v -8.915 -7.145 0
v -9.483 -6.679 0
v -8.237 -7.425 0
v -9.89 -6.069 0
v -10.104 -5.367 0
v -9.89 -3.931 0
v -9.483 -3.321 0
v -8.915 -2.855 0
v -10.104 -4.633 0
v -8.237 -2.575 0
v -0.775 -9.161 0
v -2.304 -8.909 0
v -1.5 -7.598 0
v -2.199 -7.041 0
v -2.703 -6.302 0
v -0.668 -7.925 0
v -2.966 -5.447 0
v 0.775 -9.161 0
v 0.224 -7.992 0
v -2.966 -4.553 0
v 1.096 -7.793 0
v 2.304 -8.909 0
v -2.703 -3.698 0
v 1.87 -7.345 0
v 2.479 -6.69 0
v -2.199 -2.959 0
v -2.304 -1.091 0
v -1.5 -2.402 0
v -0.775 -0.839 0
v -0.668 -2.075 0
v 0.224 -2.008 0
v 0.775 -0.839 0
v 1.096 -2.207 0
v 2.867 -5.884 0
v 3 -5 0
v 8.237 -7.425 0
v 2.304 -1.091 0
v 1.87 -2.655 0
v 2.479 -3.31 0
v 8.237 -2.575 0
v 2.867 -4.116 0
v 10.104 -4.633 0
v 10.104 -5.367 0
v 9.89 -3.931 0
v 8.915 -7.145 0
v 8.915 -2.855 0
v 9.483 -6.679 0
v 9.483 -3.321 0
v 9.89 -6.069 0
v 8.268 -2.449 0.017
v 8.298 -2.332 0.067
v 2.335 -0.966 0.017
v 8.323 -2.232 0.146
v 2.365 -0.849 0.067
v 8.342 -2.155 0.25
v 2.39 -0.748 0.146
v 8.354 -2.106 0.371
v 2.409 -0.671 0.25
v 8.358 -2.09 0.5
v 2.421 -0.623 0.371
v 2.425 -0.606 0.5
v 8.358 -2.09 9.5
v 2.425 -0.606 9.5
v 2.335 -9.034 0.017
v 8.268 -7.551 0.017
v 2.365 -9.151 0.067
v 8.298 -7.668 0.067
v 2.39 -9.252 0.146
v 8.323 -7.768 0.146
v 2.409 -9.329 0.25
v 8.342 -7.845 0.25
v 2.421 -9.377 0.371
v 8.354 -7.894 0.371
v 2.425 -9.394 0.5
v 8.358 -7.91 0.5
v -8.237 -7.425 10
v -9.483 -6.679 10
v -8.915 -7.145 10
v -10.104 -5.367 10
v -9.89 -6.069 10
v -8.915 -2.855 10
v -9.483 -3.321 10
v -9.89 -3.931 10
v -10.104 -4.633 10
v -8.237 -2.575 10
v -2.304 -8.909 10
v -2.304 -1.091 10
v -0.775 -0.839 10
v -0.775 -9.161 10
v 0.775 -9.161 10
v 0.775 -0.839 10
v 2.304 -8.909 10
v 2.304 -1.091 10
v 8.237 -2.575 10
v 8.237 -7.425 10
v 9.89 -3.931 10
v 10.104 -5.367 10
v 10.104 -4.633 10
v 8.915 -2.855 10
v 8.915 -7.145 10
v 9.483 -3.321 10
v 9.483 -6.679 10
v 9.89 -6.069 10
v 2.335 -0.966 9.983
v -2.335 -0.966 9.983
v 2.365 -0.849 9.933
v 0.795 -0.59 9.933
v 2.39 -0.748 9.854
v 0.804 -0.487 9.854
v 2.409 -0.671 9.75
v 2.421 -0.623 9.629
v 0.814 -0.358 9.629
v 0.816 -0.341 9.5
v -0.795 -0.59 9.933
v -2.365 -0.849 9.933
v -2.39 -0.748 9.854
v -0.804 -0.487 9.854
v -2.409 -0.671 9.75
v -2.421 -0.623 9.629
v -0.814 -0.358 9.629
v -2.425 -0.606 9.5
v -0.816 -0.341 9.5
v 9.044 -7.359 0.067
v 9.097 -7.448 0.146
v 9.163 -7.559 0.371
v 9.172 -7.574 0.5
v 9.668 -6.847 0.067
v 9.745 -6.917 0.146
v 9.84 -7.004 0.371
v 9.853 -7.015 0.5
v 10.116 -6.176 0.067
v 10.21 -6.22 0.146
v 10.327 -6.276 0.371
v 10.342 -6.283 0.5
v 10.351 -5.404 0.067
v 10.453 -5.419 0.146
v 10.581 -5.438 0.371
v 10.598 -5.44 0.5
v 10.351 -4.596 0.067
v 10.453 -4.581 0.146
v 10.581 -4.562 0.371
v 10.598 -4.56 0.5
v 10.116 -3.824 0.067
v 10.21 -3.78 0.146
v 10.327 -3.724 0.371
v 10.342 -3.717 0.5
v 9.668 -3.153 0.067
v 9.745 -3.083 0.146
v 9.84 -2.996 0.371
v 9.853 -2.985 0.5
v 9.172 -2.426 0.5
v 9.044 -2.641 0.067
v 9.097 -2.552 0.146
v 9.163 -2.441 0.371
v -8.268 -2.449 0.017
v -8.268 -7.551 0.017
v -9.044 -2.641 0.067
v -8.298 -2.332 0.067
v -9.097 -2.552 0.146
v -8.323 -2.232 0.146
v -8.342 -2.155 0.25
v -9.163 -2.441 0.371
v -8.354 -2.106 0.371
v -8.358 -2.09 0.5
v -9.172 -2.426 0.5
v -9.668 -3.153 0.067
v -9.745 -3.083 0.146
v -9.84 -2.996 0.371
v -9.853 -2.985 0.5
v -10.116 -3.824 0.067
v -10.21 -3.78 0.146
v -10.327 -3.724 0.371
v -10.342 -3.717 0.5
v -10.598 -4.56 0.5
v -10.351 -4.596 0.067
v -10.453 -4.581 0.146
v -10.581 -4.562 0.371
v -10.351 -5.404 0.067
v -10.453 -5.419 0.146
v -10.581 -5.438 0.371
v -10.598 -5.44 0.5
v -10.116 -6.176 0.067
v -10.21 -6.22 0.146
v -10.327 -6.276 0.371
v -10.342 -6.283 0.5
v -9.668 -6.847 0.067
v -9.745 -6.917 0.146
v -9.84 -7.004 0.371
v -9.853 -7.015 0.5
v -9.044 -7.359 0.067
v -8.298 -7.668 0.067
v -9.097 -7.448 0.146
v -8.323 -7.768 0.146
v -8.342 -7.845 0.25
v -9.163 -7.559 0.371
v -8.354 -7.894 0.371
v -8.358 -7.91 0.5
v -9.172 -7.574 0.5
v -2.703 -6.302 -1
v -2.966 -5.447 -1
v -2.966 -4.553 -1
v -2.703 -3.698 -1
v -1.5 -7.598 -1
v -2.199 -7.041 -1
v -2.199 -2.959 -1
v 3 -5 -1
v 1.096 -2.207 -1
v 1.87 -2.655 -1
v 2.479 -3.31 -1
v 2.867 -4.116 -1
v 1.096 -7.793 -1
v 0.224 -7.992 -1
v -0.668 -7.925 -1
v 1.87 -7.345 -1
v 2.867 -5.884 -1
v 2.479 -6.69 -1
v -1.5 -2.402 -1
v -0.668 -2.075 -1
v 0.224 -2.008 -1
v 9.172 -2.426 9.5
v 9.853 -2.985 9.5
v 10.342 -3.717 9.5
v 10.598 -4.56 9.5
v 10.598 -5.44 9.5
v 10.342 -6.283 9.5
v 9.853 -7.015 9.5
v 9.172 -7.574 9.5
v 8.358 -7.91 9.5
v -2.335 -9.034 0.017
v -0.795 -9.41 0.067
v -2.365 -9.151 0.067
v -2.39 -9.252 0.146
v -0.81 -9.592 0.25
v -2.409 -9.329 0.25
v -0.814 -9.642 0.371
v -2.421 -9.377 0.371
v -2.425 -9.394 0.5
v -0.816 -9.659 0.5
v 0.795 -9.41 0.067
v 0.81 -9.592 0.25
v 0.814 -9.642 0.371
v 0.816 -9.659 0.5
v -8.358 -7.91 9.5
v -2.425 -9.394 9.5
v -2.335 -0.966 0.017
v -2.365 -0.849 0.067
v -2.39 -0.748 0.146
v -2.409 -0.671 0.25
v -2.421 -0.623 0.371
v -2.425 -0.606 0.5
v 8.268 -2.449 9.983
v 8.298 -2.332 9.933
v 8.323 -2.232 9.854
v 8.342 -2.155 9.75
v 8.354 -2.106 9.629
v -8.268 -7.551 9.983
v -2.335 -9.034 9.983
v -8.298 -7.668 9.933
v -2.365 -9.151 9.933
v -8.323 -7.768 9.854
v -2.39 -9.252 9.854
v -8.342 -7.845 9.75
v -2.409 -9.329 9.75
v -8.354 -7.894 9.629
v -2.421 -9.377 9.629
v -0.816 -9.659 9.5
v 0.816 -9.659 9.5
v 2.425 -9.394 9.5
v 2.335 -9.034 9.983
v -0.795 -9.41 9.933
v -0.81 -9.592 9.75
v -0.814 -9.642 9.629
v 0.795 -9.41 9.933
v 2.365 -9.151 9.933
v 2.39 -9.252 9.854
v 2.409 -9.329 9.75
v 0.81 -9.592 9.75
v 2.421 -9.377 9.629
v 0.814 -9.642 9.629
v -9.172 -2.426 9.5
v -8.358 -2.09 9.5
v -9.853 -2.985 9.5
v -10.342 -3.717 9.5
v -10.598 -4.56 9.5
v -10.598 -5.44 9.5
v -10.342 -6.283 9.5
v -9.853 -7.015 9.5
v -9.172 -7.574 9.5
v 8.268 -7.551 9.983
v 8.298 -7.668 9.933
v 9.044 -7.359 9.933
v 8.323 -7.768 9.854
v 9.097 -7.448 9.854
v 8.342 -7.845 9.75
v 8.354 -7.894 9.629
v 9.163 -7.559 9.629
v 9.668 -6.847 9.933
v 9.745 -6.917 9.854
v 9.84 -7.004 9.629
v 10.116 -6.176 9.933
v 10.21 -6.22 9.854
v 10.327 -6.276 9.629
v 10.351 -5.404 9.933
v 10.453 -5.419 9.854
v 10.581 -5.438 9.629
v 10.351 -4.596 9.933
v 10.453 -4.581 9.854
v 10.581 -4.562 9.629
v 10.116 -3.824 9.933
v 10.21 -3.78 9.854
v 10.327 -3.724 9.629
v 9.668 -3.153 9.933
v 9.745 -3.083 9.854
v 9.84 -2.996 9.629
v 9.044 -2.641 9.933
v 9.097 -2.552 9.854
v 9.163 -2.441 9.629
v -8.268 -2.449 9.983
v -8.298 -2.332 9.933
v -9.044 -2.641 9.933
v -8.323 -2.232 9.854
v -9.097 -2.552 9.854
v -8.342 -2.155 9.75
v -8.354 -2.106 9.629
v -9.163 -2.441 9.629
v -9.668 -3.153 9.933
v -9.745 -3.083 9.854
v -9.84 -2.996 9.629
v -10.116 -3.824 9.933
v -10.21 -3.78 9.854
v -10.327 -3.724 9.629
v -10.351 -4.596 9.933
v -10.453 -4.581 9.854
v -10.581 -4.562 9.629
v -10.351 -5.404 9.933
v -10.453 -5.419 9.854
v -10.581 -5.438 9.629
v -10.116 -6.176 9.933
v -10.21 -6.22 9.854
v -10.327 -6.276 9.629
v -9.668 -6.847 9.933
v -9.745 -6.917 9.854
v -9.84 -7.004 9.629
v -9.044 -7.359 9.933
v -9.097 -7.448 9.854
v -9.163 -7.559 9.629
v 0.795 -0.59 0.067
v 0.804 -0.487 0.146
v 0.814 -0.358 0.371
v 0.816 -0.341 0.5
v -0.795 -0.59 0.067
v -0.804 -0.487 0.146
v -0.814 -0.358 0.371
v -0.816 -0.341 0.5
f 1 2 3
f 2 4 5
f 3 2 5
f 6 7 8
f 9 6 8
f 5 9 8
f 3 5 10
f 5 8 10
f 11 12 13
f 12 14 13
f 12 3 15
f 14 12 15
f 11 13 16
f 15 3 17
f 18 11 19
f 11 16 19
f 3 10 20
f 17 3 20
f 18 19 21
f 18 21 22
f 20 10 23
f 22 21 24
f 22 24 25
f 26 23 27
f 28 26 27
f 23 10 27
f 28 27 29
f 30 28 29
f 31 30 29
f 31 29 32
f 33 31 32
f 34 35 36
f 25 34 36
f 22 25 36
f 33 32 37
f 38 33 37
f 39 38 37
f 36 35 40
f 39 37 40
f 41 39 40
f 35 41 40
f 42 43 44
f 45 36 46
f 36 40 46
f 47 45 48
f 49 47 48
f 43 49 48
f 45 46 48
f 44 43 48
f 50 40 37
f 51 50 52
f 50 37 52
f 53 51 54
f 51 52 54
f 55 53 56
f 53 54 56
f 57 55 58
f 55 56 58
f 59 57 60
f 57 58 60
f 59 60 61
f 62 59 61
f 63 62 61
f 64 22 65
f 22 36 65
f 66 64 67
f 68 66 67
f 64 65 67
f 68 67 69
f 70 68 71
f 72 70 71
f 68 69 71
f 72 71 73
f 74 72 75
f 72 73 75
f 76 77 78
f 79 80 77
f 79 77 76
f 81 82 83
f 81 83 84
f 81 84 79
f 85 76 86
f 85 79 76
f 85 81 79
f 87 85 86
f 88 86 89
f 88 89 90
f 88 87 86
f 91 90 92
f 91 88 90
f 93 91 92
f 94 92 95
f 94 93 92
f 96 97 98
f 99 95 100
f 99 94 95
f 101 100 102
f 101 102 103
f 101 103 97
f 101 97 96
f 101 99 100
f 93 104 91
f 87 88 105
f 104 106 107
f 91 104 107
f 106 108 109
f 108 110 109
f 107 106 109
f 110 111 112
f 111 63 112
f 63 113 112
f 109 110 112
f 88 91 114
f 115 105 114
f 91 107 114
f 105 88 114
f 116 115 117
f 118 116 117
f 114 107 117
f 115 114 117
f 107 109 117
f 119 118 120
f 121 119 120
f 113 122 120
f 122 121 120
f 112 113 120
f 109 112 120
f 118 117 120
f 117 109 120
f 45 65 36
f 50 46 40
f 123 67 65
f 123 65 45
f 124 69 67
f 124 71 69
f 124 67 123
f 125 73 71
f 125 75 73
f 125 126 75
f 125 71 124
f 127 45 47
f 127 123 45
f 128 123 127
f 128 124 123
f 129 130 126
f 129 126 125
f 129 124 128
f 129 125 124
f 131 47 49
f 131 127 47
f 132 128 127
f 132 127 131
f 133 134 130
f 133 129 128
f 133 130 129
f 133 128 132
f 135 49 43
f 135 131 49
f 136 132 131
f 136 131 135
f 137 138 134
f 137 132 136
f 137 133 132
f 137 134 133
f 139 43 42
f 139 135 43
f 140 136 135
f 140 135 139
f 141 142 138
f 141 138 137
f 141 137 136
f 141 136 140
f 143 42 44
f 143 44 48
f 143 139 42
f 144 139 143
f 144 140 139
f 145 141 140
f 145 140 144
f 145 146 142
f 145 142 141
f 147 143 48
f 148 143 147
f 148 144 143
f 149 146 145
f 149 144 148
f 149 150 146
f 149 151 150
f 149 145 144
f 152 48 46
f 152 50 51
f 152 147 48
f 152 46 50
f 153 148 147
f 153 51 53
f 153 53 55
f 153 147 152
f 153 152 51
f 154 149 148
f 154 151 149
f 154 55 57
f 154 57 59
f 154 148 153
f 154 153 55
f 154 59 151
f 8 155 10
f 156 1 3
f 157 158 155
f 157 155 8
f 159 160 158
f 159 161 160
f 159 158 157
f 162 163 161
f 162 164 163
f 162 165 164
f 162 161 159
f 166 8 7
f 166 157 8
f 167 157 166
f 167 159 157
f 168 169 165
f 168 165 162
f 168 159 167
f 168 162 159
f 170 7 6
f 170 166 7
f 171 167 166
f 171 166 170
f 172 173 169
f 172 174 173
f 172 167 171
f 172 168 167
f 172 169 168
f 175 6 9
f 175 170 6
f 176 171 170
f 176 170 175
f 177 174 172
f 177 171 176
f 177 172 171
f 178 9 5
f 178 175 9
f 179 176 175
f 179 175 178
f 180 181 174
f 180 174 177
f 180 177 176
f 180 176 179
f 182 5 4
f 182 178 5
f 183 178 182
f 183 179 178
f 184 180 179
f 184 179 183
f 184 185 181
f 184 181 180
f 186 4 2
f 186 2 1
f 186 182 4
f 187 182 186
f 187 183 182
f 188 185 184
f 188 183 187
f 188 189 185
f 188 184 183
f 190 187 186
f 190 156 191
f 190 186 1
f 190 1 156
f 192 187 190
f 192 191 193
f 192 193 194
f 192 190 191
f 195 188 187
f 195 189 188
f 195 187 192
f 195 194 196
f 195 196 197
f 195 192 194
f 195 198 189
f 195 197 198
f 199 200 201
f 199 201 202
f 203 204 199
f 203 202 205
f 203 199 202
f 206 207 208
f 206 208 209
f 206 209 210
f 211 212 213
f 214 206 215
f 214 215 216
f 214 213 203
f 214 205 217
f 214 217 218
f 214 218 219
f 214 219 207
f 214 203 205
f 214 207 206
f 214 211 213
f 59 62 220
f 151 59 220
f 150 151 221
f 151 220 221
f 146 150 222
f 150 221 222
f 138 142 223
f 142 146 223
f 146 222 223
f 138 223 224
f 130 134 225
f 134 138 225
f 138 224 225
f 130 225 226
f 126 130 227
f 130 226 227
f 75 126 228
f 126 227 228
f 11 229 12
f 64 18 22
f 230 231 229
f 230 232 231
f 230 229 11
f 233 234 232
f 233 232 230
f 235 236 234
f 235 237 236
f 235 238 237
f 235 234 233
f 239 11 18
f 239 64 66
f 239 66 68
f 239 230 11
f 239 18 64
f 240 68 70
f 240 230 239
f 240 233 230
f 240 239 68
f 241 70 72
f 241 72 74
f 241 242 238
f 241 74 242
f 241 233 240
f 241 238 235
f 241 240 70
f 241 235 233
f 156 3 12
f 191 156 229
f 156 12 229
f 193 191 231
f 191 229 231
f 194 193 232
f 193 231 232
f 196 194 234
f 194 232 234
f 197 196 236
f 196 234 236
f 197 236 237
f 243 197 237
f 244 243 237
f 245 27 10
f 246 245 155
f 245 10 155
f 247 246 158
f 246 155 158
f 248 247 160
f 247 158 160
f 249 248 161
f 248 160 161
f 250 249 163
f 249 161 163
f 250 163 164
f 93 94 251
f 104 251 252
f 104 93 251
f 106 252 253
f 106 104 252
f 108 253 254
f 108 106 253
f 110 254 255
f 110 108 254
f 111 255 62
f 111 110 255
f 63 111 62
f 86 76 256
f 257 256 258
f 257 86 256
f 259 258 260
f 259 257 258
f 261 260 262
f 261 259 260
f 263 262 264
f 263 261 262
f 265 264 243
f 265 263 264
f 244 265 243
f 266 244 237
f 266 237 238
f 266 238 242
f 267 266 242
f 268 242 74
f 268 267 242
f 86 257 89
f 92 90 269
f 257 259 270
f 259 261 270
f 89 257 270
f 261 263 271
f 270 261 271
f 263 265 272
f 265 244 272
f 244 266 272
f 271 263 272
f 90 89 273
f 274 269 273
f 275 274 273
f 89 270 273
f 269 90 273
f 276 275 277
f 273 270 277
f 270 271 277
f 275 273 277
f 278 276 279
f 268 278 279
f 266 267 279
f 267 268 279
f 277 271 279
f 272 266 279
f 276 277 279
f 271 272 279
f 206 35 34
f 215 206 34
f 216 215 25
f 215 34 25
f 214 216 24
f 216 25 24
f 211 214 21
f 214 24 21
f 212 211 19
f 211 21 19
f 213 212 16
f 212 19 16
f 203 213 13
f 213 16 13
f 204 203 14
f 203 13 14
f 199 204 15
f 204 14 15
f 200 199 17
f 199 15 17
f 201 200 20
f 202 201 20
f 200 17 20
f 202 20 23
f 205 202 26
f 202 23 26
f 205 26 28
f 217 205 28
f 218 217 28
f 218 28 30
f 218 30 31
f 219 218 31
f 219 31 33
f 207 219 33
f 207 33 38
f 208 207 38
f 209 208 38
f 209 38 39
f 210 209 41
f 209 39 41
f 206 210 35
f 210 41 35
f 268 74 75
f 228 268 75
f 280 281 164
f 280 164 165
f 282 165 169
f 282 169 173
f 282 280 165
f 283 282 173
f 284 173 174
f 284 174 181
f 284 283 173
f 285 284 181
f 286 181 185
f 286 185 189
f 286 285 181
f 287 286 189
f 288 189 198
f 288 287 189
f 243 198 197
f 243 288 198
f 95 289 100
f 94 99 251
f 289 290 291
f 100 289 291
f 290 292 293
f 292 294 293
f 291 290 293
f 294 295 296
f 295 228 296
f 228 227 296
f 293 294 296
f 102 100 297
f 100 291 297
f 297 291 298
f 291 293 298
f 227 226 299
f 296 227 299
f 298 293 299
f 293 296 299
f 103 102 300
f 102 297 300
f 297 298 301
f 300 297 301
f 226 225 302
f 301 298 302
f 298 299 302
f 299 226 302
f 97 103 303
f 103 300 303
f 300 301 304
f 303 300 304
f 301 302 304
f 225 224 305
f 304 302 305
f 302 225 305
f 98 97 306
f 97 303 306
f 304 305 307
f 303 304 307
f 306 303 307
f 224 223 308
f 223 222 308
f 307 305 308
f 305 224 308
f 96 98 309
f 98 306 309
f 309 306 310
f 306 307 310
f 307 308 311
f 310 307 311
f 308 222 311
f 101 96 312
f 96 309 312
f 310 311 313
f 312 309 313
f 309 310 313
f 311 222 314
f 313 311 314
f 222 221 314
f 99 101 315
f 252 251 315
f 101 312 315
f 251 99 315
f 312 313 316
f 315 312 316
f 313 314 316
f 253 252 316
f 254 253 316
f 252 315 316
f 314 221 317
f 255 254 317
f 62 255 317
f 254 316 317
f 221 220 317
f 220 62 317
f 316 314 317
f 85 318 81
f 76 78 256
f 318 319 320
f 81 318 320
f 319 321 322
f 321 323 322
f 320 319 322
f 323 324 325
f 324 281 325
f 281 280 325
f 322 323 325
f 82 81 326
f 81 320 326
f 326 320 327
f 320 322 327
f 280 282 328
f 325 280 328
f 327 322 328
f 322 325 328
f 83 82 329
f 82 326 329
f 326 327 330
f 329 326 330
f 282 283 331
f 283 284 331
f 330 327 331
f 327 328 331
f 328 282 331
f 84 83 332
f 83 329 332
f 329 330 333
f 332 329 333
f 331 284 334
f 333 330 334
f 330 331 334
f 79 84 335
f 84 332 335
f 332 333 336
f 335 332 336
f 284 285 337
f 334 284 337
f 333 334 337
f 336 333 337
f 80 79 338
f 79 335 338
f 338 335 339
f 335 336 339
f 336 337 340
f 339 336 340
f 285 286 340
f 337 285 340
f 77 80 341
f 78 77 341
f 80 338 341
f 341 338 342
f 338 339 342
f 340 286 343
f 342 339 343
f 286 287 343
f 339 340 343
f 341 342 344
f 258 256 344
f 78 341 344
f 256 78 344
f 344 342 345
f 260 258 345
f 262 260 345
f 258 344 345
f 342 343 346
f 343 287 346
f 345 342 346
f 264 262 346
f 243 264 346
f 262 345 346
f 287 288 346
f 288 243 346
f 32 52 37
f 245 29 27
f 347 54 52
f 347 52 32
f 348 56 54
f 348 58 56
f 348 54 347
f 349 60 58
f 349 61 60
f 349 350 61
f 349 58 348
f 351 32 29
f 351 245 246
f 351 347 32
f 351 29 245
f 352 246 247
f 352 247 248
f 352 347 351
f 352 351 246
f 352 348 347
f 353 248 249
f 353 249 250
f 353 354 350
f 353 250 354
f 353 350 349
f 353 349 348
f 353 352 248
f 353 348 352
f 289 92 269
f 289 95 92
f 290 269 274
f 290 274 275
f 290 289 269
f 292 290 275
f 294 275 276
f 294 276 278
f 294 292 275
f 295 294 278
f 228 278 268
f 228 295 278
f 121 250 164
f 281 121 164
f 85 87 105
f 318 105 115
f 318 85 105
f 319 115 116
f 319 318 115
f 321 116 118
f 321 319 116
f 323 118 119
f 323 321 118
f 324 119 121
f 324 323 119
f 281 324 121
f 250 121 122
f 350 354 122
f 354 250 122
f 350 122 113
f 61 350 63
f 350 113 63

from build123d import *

# Parameters (mm, degrees)
EXTRUDE_1_DEPTH = 10
FILLET_1_R      = 10
FILLET_2_R      = 3
SKETCH_2_R      = 3
EXTRUDE_2_DEPTH = 1
FILLET_3_R      = 0.5


with BuildPart() as part:
    # Эскиз1 → Бобышка-Вытянуть1 (new body)
    with BuildSketch(Plane.XY):
        Polygon((0, 0), (-20, -5), (0, -10), (20, -5), align=None)
    extrude(amount=EXTRUDE_1_DEPTH)

    # Скругление1
    fillet_1_edges = [part.edges().sort_by_distance(p)[0] for p in [
        (0, -10, 5),
        (0, 0, 5),
    ]]
    fillet(fillet_1_edges, radius=FILLET_1_R)

    # Скругление2
    fillet_2_edges = [part.edges().sort_by_distance(p)[0] for p in [
        (20, -5, 5),
        (-20, -5, 5),
    ]]
    fillet(fillet_2_edges, radius=FILLET_2_R)

    # Эскиз2 → Бобышка-Вытянуть2 (add)
    with BuildSketch(Plane(origin=(0, 0, 0), x_dir=(-1, 0, 0), z_dir=(0, 0, -1))):
        with Locations(Location((0, -5, 0), (0, 0, 180))):
            Circle(SKETCH_2_R)
    extrude(amount=EXTRUDE_2_DEPTH)

    # Скругление3
    fillet_3_edges = [part.edges().sort_by_distance(p)[0] for p in [
        (5.391823124, -8.652044219, 0),
        (5.391823124, -8.652044219, 10),
        (-5.391823124, -1.347955781, 0),
        (0, -0.307764064, 0),
        (0, -9.692235936, 0),
        (-5.391823124, -1.347955781, 10),
        (0, -0.307764064, 10),
        (0, -9.692235936, 10),
        (5.391823124, -1.347955781, 0),
        (5.391823124, -1.347955781, 10),
        (-5.391823124, -8.652044219, 0),
        (-10.630683123, -5, 0),
        (10.630683123, -5, 0),
        (-5.391823124, -8.652044219, 10),
        (-10.630683123, -5, 10),
        (10.630683123, -5, 10),
    ]]
    fillet(fillet_3_edges, radius=FILLET_3_R)


solid = part.part
